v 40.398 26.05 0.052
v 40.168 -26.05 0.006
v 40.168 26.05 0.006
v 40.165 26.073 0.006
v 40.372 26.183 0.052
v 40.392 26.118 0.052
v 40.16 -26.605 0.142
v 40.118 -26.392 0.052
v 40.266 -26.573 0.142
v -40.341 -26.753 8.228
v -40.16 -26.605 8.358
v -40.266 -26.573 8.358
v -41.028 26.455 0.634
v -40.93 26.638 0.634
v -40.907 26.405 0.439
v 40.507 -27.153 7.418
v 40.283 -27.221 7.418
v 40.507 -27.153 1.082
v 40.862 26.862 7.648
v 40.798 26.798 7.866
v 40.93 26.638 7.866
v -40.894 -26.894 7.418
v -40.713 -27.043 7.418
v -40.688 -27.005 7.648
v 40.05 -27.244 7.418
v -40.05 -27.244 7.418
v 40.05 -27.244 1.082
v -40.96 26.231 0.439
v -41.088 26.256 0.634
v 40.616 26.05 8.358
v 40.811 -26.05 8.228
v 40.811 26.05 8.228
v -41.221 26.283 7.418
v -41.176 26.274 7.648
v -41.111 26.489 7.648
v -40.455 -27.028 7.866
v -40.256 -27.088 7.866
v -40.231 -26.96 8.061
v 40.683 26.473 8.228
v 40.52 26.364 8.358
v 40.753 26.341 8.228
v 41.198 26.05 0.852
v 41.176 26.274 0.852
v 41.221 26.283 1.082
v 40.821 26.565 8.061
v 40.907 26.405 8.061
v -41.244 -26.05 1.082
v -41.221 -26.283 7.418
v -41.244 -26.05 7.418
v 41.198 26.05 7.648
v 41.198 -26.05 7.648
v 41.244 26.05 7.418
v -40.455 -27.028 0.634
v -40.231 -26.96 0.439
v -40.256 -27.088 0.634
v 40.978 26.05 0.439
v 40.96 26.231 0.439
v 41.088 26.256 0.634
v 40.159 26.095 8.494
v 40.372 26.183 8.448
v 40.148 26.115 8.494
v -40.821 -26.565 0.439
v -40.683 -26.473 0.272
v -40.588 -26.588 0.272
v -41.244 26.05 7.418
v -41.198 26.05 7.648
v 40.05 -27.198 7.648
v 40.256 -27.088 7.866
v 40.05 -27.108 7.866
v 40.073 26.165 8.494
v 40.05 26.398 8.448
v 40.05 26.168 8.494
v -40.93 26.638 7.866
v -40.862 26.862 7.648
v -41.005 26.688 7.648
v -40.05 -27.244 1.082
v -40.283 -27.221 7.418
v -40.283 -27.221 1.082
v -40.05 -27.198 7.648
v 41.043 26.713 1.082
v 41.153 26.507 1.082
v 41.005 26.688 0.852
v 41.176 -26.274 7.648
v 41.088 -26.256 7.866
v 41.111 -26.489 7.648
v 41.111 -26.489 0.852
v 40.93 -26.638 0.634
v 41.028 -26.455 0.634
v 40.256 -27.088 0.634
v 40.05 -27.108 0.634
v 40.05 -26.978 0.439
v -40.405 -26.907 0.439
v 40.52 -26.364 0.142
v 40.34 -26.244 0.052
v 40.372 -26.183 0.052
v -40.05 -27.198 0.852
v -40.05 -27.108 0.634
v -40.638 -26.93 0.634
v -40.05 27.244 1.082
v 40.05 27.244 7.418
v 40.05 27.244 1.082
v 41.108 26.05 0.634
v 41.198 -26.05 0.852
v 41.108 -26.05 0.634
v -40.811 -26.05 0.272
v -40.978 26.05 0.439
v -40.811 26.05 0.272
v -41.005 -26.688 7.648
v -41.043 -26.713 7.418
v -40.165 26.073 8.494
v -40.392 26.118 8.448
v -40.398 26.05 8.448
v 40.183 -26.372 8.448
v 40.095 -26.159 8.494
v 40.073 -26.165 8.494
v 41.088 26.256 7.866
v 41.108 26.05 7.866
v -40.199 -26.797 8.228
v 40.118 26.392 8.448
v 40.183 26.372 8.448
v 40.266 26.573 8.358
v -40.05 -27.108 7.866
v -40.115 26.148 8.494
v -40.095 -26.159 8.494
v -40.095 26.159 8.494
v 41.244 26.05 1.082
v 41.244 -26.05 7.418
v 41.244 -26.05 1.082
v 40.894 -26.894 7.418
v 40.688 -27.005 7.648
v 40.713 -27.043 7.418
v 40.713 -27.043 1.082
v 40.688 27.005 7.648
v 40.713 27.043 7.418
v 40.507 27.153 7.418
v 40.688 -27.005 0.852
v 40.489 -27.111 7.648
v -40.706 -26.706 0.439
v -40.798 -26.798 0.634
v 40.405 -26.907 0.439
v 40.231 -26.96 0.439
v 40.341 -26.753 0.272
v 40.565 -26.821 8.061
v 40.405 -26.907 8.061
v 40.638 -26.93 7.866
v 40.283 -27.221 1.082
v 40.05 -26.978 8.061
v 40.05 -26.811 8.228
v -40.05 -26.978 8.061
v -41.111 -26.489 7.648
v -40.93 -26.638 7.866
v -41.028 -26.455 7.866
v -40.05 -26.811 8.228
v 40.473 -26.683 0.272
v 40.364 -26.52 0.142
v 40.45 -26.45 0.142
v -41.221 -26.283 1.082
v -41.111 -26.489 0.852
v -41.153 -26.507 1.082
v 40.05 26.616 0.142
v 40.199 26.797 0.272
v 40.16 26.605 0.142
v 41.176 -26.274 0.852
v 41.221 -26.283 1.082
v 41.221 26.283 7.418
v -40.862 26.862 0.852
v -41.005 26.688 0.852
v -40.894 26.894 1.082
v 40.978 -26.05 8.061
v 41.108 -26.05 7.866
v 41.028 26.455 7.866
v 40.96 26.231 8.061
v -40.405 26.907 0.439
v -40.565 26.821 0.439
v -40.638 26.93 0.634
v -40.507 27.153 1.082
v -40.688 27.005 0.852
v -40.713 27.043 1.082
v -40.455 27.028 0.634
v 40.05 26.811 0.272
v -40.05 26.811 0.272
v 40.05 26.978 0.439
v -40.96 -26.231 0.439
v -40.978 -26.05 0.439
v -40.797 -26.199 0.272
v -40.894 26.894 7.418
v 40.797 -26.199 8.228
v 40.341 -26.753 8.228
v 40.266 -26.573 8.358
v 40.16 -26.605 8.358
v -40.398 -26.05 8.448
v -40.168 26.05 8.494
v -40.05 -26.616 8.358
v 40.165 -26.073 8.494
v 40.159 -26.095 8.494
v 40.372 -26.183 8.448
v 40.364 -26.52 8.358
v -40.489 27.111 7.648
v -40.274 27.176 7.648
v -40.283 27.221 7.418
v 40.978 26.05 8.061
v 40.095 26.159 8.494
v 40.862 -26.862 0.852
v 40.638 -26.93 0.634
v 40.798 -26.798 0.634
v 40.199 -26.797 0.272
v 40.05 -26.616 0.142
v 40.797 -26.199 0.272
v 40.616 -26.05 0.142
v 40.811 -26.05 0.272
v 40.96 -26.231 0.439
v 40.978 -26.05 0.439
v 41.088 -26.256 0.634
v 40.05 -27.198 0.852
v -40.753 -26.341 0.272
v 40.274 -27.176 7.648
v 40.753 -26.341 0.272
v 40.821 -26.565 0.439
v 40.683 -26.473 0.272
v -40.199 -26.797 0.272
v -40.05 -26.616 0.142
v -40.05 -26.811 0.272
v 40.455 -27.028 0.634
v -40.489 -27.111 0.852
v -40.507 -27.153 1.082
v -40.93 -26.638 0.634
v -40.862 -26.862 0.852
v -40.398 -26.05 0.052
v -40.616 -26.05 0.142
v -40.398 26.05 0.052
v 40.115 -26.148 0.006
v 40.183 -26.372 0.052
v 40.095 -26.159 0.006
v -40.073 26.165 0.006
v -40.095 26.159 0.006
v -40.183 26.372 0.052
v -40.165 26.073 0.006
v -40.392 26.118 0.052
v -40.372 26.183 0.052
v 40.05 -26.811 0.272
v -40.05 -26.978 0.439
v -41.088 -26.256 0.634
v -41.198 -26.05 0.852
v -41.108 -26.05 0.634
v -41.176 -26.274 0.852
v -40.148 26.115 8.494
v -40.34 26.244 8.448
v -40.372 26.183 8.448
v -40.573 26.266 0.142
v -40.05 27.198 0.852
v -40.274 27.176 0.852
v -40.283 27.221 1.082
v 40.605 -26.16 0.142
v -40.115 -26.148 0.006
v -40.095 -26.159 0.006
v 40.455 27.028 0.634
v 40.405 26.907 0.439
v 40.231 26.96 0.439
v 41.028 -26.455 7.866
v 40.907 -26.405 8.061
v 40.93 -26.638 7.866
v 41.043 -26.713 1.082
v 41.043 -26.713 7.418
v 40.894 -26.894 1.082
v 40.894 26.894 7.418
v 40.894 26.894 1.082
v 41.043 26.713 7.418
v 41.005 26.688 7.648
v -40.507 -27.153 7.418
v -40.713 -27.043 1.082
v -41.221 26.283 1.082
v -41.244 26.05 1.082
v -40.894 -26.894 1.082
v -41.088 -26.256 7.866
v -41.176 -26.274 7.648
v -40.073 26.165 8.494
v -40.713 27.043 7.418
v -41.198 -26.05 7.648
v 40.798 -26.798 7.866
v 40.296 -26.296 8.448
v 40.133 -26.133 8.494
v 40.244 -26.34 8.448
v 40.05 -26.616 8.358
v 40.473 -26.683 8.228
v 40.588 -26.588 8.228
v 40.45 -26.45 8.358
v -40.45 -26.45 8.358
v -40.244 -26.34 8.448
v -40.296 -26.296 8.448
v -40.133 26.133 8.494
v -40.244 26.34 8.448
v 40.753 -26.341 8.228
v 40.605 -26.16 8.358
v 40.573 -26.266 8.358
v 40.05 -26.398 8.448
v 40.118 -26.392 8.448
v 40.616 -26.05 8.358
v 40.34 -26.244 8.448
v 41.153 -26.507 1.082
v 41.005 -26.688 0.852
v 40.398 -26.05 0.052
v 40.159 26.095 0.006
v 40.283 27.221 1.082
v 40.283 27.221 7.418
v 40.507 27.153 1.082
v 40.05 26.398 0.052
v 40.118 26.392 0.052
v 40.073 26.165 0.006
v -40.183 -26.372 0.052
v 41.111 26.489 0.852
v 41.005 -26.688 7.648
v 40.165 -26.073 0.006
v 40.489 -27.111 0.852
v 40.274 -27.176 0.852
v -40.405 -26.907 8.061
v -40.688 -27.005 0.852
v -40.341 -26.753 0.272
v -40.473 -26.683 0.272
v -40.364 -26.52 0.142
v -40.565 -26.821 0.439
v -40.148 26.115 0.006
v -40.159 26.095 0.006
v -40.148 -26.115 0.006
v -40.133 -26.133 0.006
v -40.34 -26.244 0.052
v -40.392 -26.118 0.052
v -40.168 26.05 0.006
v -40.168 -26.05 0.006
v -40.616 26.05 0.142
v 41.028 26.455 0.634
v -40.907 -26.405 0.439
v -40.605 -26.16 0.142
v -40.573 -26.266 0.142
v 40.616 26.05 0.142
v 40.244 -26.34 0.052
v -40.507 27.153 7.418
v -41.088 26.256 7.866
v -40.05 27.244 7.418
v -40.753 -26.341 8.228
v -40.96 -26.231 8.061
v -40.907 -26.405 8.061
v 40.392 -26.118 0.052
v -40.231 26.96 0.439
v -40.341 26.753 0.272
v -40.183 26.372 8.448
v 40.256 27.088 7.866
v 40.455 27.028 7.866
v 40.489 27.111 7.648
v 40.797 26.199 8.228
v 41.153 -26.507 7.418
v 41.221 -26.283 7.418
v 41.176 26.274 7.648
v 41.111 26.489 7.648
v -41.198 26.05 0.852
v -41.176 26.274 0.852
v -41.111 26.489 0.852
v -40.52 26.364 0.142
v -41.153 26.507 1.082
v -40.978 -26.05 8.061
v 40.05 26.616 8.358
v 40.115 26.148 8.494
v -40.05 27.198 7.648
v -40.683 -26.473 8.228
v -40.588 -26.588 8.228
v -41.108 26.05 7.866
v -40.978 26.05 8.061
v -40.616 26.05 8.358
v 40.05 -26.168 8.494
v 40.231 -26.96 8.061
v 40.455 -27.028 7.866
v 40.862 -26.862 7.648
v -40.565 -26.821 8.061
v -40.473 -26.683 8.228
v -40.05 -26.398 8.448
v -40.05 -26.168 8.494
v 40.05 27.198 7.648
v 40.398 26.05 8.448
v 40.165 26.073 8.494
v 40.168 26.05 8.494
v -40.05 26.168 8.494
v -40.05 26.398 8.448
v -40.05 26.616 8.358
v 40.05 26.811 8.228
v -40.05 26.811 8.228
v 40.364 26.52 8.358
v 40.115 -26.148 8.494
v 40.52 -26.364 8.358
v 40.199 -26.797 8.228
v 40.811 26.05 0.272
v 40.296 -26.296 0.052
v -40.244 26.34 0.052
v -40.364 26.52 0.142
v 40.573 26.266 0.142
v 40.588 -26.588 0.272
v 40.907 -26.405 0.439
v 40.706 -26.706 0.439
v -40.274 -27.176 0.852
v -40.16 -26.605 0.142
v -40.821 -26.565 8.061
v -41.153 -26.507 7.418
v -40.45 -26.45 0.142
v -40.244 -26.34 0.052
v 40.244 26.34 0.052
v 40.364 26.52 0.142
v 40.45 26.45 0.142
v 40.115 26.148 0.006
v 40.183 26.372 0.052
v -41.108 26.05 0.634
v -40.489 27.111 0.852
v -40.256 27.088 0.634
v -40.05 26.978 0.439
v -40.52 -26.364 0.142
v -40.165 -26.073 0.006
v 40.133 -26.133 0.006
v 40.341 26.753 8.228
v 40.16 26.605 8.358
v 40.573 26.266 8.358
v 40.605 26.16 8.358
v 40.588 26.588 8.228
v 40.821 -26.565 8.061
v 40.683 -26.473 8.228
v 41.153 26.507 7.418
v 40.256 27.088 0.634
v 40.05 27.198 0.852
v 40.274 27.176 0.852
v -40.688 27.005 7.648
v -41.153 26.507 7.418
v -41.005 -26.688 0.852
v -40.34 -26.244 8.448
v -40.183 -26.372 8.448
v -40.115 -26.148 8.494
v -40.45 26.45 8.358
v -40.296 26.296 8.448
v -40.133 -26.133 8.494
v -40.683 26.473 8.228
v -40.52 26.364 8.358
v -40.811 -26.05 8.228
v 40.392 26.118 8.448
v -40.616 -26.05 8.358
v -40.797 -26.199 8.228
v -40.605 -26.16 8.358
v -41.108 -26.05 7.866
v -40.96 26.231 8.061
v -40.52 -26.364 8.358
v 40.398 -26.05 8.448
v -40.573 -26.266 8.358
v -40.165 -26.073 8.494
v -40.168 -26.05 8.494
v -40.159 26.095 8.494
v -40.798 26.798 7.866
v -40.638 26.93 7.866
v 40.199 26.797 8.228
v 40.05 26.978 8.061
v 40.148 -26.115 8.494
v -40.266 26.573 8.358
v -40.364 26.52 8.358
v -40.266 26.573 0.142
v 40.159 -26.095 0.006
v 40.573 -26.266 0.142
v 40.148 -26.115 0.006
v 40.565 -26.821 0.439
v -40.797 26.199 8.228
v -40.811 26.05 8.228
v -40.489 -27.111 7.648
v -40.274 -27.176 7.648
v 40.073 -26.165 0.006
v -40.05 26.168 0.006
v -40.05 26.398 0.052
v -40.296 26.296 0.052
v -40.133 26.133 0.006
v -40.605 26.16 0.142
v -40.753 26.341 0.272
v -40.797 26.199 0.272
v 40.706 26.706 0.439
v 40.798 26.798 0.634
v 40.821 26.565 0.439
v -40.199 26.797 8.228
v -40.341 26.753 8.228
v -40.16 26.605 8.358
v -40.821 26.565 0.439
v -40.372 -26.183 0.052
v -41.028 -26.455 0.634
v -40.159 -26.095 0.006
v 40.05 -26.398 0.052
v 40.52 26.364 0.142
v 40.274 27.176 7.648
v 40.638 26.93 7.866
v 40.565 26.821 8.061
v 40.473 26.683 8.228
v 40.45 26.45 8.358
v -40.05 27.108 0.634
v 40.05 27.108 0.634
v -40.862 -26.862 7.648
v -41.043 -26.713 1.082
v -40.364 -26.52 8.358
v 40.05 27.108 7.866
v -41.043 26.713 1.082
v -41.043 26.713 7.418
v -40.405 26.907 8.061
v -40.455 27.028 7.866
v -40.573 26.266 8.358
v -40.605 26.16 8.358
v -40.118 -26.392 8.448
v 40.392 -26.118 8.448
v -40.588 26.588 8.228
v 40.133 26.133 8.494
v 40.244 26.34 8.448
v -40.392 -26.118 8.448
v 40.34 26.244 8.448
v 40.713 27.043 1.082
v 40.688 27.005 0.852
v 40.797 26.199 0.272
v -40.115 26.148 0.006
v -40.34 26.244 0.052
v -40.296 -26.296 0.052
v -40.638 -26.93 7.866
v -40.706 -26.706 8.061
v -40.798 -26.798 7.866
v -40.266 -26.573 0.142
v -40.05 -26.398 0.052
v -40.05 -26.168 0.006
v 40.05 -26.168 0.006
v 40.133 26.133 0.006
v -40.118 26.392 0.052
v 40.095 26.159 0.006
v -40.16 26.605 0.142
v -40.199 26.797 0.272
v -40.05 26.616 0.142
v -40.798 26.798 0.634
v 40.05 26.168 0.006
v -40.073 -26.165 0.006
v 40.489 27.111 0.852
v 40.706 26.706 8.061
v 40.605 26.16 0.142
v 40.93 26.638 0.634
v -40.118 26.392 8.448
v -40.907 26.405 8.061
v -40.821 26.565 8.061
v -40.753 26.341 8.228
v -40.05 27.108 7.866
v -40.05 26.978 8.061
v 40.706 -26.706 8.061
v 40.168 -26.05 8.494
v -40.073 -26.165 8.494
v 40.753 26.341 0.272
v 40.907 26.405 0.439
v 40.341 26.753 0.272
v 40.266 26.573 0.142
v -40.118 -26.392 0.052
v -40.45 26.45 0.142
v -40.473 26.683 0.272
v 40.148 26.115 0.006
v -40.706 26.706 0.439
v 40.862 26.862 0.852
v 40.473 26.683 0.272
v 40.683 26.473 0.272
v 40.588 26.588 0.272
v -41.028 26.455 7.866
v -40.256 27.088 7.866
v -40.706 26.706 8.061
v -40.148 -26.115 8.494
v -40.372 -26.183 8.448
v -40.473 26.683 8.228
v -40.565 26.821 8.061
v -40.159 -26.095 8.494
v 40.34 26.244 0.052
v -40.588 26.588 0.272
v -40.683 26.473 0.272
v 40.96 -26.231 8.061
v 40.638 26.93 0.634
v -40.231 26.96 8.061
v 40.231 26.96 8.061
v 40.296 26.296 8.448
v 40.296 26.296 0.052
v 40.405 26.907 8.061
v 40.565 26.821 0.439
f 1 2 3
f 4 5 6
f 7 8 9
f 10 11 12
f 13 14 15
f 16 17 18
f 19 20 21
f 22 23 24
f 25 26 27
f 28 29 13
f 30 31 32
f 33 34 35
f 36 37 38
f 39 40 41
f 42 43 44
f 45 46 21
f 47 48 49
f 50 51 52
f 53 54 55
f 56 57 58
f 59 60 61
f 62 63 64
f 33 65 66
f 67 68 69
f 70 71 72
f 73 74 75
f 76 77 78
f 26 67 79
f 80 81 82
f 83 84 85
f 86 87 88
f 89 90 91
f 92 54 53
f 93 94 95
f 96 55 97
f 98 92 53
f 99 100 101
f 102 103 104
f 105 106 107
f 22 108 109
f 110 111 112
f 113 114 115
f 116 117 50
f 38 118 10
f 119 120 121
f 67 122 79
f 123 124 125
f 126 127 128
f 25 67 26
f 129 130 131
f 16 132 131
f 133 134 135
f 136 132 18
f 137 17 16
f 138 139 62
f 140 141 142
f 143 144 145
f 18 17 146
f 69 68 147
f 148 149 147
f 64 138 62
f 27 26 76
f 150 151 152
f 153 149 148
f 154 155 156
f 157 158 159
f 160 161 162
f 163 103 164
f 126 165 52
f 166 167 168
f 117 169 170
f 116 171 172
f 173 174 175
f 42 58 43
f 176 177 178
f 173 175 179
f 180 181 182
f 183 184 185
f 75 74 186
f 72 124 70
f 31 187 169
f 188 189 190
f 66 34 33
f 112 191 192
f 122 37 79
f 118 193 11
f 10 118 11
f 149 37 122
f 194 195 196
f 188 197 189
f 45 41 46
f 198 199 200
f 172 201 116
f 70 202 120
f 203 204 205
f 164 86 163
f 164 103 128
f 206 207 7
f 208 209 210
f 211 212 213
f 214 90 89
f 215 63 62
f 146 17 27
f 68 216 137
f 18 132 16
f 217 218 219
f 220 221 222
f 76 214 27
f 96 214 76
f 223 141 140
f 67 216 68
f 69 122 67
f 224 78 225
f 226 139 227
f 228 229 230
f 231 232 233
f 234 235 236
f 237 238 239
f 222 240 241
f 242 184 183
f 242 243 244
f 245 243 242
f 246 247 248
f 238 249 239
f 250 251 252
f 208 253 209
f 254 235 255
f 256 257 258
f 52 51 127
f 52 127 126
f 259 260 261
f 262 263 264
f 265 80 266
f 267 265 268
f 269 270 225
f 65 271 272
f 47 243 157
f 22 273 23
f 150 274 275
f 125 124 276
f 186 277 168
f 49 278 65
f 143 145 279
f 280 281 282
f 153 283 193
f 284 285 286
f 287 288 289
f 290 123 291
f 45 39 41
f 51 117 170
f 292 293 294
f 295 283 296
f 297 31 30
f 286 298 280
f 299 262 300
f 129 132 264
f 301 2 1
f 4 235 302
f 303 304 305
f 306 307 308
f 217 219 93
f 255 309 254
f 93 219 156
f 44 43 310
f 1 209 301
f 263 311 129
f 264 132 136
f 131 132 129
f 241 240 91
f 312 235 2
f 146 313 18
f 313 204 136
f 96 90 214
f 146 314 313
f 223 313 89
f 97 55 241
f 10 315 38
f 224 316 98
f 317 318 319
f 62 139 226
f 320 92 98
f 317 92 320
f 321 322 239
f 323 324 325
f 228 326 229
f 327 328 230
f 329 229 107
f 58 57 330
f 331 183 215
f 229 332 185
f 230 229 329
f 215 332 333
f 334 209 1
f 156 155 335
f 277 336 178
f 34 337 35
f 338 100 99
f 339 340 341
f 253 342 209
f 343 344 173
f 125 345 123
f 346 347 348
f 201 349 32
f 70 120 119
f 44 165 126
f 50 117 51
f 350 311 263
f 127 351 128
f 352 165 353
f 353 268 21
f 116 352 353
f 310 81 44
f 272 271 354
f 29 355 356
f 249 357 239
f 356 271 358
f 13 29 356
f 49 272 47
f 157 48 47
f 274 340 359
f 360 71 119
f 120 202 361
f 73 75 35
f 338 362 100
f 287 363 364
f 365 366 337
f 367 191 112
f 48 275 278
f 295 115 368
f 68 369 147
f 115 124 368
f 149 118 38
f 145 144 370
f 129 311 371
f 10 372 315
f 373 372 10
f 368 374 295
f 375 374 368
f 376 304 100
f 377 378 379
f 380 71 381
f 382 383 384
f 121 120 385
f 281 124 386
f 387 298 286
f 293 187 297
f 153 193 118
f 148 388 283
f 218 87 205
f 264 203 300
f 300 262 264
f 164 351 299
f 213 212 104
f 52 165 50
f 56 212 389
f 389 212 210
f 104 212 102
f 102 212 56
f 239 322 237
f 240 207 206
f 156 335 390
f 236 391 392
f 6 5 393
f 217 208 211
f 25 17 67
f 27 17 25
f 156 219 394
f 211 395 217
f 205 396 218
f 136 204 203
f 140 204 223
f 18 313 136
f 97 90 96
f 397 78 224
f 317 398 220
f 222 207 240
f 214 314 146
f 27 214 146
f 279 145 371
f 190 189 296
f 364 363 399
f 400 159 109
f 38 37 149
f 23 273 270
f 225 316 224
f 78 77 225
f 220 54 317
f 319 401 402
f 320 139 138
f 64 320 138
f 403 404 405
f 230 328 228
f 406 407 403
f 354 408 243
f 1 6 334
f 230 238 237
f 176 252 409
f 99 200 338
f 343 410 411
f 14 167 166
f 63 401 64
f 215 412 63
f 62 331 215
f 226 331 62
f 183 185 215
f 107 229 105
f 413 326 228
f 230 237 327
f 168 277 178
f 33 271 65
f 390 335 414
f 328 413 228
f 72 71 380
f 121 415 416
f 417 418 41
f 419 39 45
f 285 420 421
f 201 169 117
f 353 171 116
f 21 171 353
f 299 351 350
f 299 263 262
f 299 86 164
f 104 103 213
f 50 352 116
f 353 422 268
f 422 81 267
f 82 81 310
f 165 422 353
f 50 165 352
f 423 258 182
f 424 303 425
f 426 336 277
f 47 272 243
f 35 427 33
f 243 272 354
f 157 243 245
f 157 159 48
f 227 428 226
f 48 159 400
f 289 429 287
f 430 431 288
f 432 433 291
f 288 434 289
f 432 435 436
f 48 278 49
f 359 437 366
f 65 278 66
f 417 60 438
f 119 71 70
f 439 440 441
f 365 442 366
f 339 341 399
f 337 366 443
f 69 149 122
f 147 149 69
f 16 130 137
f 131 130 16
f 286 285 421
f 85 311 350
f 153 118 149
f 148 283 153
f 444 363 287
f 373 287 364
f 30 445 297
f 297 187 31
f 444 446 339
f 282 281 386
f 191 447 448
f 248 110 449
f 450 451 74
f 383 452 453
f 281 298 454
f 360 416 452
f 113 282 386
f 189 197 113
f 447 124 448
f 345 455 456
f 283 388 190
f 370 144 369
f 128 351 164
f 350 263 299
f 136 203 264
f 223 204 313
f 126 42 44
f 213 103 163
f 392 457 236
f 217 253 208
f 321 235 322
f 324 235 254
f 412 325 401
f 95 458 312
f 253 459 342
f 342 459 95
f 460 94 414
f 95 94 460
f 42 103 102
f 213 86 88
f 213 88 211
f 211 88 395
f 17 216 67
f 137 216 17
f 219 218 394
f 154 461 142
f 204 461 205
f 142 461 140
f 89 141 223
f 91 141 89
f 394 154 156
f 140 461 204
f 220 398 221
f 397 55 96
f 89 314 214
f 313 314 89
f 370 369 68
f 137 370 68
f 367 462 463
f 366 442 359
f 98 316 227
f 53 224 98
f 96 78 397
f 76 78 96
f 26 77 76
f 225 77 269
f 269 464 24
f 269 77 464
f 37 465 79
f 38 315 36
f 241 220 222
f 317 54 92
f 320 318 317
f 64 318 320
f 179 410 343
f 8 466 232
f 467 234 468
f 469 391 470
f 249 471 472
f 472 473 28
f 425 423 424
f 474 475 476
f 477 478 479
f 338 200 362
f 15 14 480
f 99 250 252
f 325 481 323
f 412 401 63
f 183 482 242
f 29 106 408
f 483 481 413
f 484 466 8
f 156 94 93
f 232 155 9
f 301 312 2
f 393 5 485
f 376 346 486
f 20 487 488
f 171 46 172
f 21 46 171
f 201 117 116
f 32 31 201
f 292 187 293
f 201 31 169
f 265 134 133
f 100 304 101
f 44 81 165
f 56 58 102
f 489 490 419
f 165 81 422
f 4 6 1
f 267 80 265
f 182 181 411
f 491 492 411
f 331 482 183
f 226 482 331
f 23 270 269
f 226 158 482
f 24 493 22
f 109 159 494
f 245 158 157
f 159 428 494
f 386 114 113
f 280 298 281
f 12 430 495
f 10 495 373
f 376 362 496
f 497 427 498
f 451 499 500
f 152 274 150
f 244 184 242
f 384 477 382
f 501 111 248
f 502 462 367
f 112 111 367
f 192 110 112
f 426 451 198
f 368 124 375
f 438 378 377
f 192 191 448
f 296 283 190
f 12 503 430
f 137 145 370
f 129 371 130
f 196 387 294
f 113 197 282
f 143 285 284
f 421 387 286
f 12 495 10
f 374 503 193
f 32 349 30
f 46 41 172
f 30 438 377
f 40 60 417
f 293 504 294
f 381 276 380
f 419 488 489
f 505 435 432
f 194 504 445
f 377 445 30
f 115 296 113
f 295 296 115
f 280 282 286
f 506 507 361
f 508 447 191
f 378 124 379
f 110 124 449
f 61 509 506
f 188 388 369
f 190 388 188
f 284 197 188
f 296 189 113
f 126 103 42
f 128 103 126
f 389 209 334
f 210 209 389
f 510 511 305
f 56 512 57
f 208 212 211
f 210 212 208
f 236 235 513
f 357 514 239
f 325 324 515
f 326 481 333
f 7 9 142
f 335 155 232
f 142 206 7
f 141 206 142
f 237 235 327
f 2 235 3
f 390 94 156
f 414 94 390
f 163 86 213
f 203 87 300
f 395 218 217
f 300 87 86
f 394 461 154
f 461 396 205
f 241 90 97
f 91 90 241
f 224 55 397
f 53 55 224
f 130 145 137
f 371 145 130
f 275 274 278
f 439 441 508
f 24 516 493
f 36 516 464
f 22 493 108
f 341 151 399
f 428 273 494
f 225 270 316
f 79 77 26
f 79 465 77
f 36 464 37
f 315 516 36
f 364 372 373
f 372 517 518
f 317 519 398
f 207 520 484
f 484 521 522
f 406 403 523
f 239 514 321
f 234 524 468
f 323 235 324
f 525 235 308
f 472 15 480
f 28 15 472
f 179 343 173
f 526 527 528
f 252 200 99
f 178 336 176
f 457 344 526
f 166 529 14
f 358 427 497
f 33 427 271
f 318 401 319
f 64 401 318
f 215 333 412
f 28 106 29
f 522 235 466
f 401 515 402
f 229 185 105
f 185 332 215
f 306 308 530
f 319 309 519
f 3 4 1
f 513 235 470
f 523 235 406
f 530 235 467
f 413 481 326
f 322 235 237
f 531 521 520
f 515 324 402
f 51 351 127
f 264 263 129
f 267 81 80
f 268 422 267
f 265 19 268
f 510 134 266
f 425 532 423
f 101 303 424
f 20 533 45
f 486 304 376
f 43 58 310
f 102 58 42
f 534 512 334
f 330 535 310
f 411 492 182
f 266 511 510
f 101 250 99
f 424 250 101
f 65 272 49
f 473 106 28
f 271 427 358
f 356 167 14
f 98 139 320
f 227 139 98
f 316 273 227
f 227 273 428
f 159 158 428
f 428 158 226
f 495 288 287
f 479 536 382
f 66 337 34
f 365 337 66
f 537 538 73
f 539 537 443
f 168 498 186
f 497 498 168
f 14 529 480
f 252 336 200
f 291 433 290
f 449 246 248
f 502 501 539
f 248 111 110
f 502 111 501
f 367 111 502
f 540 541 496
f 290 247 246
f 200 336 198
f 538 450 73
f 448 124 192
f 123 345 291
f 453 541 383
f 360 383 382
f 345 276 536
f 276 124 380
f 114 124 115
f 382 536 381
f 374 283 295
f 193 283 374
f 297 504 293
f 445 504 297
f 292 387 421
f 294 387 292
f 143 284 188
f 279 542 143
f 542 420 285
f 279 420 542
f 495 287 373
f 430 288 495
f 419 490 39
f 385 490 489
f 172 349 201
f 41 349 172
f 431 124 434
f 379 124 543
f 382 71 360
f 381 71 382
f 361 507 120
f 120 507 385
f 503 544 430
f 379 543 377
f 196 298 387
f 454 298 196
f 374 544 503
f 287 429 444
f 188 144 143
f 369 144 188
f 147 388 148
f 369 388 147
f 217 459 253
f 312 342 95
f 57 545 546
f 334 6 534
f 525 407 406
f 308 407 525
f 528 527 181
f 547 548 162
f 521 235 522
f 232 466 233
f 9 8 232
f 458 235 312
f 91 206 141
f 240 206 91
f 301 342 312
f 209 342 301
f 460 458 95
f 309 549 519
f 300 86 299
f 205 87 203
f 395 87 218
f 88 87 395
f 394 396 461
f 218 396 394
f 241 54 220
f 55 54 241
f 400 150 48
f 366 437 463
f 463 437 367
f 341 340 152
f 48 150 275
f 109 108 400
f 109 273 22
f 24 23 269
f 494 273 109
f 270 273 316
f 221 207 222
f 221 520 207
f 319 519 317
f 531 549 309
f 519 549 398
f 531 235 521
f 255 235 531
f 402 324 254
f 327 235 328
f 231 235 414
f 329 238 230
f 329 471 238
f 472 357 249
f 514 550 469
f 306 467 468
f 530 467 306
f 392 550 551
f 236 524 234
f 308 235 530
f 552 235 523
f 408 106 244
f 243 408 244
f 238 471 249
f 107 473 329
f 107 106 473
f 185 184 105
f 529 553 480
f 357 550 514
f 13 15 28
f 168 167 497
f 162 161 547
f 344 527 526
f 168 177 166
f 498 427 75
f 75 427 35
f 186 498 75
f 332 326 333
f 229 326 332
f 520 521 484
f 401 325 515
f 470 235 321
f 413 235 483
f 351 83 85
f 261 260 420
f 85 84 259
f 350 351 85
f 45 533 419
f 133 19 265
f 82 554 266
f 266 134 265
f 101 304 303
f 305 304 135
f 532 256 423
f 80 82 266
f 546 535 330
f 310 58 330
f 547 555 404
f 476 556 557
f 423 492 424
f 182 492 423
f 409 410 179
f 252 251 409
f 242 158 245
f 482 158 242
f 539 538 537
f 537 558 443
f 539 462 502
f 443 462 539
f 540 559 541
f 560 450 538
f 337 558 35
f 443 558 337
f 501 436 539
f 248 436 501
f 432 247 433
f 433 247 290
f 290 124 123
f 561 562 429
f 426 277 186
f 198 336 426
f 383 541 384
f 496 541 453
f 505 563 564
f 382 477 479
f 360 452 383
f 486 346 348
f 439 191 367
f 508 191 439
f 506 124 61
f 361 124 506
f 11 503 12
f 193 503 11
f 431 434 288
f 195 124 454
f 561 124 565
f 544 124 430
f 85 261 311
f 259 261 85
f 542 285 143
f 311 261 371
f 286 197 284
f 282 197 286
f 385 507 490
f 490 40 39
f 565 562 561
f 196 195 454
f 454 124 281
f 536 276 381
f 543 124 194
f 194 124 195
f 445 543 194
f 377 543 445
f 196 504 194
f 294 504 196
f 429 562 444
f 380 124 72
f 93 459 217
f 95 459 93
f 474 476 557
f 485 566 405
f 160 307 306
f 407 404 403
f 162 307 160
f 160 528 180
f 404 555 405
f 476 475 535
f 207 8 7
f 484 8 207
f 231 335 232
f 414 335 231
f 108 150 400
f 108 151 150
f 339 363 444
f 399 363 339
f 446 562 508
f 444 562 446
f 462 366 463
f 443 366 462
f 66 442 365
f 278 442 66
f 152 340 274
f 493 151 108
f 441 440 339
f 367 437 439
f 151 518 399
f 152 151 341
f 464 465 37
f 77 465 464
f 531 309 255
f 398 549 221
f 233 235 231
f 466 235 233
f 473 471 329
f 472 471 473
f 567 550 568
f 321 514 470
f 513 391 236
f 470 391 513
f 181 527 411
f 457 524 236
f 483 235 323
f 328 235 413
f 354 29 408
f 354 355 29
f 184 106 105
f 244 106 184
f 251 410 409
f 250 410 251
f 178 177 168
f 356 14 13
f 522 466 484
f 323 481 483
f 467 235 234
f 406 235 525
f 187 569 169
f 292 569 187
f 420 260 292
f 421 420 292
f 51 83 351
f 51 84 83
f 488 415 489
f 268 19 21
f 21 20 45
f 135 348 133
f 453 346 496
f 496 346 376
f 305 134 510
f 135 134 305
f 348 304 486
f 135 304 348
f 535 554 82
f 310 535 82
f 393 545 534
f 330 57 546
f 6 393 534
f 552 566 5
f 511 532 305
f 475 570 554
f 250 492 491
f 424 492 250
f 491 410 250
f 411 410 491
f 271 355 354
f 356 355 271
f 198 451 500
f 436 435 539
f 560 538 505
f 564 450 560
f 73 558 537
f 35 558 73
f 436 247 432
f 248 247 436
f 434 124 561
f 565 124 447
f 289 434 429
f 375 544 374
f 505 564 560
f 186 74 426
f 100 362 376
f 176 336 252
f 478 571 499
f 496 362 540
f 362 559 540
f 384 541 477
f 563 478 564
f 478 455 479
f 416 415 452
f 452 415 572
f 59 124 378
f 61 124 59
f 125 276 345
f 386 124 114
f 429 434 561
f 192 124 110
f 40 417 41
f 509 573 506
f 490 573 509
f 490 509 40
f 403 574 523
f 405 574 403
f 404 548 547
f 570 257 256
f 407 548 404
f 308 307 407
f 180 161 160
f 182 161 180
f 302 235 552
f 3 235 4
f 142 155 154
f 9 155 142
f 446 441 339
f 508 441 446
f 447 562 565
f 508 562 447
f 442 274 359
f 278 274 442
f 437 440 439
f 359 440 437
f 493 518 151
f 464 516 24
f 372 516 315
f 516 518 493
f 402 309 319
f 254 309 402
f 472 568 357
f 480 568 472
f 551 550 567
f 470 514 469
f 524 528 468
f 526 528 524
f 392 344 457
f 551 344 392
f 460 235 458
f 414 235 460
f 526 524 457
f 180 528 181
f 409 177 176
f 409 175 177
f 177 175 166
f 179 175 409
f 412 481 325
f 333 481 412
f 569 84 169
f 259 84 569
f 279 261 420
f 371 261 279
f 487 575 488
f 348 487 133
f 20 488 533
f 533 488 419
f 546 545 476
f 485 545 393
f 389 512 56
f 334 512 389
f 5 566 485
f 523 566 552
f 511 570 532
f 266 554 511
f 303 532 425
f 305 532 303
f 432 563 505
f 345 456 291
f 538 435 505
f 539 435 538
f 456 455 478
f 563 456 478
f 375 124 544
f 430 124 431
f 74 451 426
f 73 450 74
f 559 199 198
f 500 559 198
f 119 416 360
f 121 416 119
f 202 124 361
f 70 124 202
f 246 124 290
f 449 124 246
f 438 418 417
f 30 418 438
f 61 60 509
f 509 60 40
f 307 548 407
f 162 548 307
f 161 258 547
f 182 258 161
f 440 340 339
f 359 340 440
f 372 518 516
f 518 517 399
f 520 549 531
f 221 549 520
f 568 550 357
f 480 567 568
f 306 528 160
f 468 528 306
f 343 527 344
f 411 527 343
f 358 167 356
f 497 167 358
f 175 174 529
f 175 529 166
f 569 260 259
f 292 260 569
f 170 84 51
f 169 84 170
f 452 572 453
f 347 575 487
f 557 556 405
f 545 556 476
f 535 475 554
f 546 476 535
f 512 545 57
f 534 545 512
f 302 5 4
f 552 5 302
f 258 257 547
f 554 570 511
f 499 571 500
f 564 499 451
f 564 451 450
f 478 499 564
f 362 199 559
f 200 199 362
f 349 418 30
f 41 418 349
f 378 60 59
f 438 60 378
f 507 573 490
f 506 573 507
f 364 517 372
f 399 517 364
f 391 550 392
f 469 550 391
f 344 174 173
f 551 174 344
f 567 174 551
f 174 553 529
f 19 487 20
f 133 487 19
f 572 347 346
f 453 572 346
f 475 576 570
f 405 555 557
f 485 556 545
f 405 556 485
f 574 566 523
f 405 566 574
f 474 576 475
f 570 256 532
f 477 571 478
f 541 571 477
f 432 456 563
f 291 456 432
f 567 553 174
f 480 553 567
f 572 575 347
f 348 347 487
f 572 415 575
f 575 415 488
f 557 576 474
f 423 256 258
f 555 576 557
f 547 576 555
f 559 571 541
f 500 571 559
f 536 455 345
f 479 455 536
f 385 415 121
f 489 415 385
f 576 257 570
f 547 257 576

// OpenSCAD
// Breadboard 400 (半尺寸麵包板（400 孔）) visual source for NexCAD.
// Units: millimeters. Origin: part bottom-center, matching src/parts/library.ts.
// This generated baseline is intentionally simple; refine it with measured details before exporting STL.

$fn = 32;

module rounded_box(size, r = 0.8) {
  hull() {
    for (x = [-size[0] / 2 + r, size[0] / 2 - r])
      for (y = [-size[1] / 2 + r, size[1] / 2 - r]) {
        translate([x, y, r]) sphere(r = r);
        translate([x, y, size[2] - r]) sphere(r = r);
      }
  }
}

color("#2e7d5b") rounded_box([82.5, 54.5, 8.5], min(1.2, min(82.5, 54.5) / 8));
